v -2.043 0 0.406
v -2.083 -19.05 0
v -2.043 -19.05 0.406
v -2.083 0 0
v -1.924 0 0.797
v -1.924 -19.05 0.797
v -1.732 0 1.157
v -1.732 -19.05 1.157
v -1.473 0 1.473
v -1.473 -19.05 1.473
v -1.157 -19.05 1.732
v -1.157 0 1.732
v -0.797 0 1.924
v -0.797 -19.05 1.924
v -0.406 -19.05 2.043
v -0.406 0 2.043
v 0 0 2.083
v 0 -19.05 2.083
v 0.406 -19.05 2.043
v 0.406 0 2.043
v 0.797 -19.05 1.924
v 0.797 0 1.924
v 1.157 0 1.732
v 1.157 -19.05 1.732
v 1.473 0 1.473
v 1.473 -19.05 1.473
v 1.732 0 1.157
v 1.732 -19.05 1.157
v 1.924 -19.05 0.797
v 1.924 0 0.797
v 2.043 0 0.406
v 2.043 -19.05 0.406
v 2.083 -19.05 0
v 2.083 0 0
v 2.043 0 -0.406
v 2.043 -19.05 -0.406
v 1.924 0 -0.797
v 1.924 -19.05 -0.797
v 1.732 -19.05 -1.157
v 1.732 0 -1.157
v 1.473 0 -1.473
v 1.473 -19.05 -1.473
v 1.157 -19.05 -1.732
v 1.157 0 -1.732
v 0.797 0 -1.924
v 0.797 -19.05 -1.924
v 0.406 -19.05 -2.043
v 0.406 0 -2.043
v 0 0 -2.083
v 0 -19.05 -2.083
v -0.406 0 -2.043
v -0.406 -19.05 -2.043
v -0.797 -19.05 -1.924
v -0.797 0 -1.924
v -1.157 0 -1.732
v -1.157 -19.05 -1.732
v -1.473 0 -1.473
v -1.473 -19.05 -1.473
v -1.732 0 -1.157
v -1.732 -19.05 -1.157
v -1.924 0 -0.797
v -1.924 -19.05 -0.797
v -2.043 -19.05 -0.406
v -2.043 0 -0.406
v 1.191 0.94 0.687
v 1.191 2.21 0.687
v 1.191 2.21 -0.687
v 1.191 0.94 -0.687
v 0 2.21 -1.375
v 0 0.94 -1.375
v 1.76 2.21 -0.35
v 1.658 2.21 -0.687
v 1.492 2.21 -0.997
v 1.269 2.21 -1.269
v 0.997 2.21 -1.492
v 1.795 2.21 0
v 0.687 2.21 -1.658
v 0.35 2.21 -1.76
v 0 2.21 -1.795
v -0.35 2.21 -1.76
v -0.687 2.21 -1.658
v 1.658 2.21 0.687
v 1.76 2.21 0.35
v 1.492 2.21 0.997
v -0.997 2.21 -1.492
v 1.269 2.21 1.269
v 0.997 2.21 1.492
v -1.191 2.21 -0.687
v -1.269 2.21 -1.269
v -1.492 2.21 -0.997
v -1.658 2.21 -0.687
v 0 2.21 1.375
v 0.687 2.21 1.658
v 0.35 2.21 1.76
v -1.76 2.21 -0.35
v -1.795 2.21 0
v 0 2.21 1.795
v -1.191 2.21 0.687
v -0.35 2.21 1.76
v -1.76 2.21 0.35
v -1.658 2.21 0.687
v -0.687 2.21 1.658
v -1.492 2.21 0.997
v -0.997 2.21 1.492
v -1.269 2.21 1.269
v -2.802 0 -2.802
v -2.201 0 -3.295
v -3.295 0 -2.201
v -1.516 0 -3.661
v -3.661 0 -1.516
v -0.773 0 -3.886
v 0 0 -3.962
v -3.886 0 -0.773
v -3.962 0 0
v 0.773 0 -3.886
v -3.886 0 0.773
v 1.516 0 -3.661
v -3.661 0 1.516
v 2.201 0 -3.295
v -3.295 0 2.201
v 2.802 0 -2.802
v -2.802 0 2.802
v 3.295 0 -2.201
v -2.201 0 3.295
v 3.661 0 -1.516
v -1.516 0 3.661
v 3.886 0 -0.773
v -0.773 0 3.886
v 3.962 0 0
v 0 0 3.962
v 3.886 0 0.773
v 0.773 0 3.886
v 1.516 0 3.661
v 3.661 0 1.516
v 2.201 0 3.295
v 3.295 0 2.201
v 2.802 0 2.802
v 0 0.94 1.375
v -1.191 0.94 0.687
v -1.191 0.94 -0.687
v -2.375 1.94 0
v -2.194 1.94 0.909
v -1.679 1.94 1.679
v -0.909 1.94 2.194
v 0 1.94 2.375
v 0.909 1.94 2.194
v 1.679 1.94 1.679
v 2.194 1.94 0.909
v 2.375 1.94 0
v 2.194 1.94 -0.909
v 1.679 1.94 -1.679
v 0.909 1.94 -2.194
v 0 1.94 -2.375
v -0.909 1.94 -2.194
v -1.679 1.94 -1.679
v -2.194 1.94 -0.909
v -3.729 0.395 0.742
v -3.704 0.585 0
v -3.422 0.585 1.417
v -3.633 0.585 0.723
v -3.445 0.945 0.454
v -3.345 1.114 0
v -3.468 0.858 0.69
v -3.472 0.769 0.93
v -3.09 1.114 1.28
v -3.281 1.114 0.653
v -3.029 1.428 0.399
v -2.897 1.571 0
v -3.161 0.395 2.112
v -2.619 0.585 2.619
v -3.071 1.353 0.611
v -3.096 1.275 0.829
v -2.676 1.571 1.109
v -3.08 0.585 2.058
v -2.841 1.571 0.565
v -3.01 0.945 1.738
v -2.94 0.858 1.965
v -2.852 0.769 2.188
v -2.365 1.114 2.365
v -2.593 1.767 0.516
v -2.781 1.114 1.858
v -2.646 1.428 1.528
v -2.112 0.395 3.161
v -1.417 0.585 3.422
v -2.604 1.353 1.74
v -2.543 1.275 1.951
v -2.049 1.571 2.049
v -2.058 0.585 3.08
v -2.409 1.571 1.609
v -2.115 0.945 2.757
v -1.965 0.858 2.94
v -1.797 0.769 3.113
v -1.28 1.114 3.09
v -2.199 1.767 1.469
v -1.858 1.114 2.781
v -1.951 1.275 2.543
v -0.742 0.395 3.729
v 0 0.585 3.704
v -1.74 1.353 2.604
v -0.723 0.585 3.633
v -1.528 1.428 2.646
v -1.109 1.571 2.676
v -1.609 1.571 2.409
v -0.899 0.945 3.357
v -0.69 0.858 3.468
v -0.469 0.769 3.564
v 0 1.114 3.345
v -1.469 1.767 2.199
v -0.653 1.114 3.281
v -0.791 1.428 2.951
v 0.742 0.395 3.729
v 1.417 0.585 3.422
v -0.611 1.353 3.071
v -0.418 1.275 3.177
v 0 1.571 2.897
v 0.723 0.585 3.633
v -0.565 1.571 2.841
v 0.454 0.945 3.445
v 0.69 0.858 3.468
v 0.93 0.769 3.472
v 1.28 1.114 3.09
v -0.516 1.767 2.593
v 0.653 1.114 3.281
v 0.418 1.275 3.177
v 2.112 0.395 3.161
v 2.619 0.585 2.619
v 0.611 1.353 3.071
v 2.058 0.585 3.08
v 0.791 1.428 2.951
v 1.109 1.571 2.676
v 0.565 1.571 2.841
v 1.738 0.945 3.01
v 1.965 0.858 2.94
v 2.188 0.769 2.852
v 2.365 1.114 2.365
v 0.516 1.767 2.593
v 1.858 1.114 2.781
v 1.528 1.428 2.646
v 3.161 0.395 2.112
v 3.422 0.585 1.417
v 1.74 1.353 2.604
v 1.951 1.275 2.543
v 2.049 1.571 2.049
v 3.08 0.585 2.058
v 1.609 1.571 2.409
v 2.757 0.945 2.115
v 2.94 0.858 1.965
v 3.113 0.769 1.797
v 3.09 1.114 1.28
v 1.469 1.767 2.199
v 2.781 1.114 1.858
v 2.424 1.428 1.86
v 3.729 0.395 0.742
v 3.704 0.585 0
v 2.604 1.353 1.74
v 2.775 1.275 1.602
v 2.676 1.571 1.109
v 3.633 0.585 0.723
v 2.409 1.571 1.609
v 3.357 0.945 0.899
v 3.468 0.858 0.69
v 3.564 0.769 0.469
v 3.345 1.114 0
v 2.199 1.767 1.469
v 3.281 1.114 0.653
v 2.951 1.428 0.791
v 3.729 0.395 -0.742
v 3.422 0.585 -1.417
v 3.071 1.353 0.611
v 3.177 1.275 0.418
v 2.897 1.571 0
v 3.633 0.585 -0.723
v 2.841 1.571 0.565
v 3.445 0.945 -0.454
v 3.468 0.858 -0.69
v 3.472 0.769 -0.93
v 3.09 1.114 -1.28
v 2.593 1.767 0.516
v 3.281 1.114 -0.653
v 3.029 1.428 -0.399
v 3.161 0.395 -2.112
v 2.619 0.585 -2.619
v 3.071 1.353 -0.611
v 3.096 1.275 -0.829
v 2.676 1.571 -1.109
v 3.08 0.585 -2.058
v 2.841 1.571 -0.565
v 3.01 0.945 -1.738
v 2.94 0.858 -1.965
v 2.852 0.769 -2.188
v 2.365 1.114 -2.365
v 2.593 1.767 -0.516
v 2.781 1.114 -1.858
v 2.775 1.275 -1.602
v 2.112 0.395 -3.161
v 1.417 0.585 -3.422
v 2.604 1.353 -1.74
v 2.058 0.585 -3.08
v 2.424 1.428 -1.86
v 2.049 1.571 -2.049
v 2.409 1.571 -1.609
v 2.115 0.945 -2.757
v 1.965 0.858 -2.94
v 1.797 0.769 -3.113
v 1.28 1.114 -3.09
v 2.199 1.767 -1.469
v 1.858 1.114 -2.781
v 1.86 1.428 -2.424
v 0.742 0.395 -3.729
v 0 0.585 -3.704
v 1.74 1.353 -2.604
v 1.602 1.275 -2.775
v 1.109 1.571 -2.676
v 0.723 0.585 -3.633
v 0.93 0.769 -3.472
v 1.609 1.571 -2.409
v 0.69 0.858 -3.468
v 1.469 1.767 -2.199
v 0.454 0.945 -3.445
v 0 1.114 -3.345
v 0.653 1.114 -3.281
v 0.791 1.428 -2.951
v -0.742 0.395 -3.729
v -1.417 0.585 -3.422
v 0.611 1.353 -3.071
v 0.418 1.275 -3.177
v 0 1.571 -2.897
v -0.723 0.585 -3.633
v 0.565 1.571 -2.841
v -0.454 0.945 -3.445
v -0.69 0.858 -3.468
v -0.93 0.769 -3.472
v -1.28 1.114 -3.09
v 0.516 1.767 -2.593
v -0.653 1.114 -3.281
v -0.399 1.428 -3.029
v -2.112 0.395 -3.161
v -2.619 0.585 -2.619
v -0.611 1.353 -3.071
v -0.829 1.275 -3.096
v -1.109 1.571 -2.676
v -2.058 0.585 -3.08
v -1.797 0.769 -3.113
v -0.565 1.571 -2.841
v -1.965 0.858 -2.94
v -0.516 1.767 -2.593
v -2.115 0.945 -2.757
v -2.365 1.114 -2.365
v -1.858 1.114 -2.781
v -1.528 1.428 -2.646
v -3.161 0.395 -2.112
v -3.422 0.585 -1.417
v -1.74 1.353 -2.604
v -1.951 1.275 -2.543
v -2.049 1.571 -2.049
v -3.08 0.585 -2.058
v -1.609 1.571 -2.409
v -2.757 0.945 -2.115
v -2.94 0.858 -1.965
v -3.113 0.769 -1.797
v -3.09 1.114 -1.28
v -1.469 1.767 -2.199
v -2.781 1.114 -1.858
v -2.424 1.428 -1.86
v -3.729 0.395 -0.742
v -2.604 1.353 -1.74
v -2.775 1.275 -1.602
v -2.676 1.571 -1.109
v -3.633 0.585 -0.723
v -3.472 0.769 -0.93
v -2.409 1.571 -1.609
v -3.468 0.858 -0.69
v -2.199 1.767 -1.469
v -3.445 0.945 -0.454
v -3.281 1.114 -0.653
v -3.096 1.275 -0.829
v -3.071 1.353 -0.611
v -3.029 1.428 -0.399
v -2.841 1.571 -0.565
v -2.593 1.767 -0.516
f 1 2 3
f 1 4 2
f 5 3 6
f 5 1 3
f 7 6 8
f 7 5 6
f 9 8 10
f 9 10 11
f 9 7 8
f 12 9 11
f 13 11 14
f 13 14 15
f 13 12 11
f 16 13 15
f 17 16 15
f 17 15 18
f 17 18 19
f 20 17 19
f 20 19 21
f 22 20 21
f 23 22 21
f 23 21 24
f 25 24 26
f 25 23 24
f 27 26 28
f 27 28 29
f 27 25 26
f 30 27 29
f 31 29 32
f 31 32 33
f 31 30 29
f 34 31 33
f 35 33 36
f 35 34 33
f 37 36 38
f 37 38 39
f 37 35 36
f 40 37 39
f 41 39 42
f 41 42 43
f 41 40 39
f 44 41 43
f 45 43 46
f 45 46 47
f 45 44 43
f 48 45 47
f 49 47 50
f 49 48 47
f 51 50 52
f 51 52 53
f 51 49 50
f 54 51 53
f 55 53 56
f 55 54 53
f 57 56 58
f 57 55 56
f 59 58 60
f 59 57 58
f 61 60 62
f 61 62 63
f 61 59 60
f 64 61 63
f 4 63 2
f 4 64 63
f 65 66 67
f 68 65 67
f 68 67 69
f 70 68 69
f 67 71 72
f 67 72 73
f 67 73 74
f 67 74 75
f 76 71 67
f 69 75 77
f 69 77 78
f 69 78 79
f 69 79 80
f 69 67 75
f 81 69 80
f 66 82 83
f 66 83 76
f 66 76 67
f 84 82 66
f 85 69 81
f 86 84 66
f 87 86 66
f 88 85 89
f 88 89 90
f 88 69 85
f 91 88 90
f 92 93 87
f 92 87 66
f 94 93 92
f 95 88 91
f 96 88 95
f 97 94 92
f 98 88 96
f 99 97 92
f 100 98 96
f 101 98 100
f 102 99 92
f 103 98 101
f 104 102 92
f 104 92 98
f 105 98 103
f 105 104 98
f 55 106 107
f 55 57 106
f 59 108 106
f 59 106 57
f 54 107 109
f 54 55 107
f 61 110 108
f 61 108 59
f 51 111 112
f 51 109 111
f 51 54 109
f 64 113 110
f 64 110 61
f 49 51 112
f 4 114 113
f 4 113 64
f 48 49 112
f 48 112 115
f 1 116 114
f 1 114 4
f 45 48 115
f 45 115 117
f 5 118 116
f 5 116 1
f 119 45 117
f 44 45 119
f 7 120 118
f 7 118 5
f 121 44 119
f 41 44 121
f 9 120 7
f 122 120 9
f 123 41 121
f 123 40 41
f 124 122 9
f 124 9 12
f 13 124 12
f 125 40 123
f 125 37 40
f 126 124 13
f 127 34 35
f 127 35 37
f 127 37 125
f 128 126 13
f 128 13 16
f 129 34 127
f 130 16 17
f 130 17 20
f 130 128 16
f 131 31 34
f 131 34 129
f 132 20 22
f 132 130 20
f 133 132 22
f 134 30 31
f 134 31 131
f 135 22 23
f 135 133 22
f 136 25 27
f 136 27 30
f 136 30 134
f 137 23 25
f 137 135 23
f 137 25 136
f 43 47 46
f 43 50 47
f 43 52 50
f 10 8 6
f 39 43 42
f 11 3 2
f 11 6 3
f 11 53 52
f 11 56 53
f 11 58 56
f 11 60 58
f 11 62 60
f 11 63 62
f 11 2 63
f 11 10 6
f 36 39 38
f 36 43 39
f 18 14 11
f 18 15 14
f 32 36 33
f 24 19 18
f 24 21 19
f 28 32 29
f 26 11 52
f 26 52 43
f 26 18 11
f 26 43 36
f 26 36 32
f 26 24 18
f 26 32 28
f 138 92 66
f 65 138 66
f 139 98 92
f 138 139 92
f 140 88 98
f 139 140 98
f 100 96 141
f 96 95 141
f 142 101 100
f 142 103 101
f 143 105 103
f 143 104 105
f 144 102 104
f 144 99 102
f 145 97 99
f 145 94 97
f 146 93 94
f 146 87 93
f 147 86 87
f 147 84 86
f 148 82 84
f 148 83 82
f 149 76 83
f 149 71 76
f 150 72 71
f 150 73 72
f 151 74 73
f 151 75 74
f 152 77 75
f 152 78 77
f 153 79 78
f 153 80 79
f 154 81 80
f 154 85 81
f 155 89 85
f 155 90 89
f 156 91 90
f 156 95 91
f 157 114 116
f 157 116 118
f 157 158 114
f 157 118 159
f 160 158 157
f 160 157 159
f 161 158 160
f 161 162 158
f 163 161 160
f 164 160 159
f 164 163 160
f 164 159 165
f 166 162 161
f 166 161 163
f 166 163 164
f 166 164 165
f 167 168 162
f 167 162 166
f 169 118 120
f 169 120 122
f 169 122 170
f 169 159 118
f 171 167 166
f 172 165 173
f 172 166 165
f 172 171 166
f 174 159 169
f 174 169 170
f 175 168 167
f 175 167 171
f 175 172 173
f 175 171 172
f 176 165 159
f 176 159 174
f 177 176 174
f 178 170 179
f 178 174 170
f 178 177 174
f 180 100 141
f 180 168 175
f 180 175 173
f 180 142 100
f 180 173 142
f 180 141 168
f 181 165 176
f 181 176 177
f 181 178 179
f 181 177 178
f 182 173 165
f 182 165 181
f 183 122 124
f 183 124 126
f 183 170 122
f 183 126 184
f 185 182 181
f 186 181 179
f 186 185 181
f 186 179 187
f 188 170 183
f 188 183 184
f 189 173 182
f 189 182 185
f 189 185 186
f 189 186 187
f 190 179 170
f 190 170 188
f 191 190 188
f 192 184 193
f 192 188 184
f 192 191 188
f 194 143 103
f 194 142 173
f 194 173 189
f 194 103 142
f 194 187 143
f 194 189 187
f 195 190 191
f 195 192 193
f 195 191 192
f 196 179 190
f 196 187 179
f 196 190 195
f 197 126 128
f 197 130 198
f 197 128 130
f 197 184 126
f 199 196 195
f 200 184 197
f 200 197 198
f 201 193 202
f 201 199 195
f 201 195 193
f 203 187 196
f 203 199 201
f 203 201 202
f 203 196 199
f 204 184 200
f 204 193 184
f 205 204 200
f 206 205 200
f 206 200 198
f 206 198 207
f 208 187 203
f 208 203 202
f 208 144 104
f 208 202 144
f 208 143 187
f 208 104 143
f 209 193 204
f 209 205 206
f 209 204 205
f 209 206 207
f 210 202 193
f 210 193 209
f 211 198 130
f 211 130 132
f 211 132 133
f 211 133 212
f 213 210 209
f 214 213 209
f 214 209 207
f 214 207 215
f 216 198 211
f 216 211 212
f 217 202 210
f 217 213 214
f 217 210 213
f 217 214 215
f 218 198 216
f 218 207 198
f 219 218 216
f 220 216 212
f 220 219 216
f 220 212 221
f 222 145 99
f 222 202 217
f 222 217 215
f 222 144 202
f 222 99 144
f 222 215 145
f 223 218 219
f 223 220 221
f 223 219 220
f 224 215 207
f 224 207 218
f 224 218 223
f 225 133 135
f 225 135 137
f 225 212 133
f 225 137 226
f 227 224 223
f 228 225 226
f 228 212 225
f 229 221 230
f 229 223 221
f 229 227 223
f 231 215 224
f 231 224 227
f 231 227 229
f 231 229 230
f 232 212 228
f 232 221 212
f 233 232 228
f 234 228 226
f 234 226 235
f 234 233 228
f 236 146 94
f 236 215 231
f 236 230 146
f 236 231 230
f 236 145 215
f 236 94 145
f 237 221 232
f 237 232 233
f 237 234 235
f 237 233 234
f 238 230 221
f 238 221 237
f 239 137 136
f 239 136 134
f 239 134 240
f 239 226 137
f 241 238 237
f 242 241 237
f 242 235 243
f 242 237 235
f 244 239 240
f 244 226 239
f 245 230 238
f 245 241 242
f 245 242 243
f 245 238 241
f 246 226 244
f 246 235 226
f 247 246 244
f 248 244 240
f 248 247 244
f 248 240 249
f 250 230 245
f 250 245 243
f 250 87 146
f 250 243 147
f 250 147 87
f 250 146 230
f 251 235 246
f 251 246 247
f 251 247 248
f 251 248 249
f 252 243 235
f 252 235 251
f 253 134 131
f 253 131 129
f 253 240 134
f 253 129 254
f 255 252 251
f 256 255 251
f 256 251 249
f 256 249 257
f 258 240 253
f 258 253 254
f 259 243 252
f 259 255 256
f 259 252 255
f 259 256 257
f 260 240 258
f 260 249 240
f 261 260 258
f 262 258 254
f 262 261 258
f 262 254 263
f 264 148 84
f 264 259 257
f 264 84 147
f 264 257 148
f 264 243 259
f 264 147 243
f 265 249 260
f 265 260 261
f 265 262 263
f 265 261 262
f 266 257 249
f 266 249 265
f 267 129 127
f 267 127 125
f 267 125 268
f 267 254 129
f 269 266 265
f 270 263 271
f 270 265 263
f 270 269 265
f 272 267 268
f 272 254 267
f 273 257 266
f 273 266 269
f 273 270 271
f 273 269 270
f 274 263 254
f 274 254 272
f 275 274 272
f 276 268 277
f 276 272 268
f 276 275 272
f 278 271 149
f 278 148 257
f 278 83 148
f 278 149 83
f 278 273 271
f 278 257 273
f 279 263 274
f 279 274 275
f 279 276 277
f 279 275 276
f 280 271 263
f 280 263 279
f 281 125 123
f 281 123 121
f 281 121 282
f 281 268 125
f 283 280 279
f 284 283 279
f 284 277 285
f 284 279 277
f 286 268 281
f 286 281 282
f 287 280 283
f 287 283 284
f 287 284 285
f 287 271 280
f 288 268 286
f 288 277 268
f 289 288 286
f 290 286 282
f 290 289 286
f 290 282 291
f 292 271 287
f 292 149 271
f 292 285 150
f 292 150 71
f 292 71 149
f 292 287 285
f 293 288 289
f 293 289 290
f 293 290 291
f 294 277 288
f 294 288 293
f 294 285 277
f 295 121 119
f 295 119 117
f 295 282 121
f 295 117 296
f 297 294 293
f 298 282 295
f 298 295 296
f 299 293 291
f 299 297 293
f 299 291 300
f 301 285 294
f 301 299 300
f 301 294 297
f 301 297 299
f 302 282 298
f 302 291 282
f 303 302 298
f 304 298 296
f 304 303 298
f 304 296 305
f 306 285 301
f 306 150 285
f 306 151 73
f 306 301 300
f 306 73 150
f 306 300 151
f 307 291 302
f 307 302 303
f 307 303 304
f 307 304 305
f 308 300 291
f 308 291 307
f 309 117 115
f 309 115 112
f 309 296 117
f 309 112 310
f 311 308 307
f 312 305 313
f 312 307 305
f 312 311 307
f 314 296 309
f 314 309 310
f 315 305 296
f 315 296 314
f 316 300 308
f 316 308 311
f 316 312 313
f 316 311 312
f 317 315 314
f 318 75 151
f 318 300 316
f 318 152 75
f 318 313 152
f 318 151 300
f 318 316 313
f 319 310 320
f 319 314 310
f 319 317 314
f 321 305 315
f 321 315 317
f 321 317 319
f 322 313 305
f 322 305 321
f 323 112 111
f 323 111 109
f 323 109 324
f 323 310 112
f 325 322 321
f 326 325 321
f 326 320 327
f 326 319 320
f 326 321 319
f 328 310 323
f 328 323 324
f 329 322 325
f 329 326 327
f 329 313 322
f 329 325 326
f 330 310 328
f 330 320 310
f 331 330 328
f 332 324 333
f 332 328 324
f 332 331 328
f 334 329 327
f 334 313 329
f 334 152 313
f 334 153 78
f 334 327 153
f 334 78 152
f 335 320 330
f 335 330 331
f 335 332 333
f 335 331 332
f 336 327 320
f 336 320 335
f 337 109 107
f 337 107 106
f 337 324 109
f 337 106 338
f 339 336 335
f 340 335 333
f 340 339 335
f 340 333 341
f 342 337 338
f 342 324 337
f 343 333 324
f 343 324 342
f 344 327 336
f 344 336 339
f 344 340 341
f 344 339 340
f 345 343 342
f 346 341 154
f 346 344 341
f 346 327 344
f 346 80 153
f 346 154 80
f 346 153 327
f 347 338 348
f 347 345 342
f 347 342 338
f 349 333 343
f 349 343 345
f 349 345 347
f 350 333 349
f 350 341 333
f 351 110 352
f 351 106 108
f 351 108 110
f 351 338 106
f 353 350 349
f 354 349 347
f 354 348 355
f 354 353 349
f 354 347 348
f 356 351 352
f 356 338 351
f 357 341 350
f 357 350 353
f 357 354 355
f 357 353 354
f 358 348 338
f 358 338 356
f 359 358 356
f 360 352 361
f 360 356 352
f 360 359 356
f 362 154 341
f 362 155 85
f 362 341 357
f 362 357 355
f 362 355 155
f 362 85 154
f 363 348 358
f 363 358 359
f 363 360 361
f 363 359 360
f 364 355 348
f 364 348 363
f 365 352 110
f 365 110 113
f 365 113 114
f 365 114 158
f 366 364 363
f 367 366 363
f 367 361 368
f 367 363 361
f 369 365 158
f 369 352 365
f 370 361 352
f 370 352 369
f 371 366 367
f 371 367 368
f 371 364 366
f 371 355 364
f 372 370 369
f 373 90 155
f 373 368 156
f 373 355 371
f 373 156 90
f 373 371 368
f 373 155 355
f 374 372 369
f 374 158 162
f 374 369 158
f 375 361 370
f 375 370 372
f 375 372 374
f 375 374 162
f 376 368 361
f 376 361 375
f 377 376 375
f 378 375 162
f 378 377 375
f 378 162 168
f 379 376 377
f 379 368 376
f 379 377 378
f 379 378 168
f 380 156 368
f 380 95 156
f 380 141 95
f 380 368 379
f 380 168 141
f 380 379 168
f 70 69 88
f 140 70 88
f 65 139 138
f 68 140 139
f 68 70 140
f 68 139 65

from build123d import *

# Parameters (mm, degrees)
CUT_EXTRUDE1_DEPTH = 1.27


with BuildPart() as part:
    # Sketch1 → Revolve1 (revolve)
    with BuildSketch(Plane.XY):
        with BuildLine():
            Line((-2.0828, 0), (-3.9624, 0))
            ThreePointArc((-3.9624, 0), (-3.131232795, 1.352726455), (-1.79477003, 2.2098))
            Line((-1.79477003, 2.2098), (0, 2.2098))
            Line((0, 2.2098), (0, -19.05))
            Line((0, -19.05), (-2.0828, -19.05))
            Line((-2.0828, -19.05), (-2.0828, 0))
        make_face()
    revolve(axis=Axis((0, -19.05, 0), (0, 1, 0)))

    # Sketch2 → Cut-Extrude1 (cut)
    with BuildSketch(Plane(origin=(0, 2.2098, 0), x_dir=(1, 0, 0), z_dir=(0, 1, 0))):
        Polygon((-1.190625, 0.687407664), (-1.190625, -0.687407664), (0, -1.374815329), (1.190625, -0.687407664), (1.190625, 0.687407664), (0, 1.374815329), align=None)
    extrude(amount=-CUT_EXTRUDE1_DEPTH, mode=Mode.SUBTRACT)


solid = part.part
